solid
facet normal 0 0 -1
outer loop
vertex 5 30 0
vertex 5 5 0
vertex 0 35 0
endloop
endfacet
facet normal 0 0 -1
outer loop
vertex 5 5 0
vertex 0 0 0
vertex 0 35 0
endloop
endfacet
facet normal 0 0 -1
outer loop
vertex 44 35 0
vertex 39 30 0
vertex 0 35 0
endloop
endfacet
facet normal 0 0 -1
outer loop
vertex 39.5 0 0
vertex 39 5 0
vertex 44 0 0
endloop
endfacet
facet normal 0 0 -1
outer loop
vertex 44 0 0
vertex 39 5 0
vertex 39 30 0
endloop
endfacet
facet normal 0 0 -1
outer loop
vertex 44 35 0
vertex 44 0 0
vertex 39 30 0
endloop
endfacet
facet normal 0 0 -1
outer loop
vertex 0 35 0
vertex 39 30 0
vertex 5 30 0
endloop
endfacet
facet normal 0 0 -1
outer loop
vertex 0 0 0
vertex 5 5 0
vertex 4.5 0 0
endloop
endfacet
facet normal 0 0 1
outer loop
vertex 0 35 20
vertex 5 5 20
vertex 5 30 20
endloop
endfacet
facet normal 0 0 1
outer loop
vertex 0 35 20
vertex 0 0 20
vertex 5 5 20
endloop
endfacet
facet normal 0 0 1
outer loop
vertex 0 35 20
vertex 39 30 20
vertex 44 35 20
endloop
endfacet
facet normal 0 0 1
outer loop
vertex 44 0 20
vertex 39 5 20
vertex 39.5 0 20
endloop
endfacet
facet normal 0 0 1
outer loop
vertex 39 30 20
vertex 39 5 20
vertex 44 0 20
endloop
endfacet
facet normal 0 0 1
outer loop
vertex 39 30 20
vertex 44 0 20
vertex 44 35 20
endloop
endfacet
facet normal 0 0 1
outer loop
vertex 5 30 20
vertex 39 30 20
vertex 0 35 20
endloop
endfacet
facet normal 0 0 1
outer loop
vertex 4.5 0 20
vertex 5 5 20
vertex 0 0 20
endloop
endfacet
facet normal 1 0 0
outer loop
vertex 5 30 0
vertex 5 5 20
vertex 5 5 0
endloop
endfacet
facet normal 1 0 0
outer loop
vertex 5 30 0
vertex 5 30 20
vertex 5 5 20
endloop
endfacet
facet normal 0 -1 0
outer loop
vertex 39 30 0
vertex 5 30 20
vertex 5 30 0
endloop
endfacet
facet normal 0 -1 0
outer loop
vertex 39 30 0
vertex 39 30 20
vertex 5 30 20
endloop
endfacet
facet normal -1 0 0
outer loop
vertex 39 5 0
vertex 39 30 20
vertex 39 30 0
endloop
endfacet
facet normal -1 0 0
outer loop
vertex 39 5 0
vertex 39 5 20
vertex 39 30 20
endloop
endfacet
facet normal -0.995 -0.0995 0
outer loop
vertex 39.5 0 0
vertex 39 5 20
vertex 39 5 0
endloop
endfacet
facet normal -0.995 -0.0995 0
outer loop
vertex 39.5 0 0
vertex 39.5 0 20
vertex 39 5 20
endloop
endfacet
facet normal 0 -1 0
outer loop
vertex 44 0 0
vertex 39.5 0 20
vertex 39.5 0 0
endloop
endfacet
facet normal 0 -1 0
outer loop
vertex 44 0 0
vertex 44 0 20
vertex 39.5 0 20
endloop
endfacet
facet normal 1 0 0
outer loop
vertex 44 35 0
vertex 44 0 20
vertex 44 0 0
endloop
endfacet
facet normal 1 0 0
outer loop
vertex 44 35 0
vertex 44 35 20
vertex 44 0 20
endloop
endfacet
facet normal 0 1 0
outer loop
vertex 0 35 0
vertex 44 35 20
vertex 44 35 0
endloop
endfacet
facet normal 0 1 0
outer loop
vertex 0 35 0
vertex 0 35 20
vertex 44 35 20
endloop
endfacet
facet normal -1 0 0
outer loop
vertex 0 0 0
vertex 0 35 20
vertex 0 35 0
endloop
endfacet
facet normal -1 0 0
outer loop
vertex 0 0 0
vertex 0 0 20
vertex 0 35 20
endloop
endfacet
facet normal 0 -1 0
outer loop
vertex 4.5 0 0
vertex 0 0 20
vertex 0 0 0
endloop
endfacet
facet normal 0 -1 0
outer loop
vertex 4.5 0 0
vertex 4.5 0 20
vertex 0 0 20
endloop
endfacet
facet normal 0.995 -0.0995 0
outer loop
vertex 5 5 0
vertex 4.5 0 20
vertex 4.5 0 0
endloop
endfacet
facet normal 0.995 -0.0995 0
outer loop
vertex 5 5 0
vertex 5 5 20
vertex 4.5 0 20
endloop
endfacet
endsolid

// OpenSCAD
// u clip by stephan hafiz
ClipInnerWidth = 34;
ClipInnerHight = 30;
ClipThikiness = 5;
ClipHigh = 20;

color ("red") linear_extrude (ClipHigh)
polygon(points=[[0,0],[ClipThikiness-ClipThikiness/10,0],[ClipThikiness,ClipThikiness],
		[ClipThikiness,ClipInnerHight],[ClipThikiness+ClipInnerWidth,ClipInnerHight],[ClipThikiness+ClipInnerWidth,ClipThikiness],[ClipThikiness+ClipInnerWidth+ClipThikiness/10,0],
		[ClipThikiness+ClipInnerWidth+ClipThikiness,0], [ClipThikiness+ClipInnerWidth+ClipThikiness,ClipInnerHight+ClipThikiness],[0,ClipInnerHight+ClipThikiness]
	     ]);
